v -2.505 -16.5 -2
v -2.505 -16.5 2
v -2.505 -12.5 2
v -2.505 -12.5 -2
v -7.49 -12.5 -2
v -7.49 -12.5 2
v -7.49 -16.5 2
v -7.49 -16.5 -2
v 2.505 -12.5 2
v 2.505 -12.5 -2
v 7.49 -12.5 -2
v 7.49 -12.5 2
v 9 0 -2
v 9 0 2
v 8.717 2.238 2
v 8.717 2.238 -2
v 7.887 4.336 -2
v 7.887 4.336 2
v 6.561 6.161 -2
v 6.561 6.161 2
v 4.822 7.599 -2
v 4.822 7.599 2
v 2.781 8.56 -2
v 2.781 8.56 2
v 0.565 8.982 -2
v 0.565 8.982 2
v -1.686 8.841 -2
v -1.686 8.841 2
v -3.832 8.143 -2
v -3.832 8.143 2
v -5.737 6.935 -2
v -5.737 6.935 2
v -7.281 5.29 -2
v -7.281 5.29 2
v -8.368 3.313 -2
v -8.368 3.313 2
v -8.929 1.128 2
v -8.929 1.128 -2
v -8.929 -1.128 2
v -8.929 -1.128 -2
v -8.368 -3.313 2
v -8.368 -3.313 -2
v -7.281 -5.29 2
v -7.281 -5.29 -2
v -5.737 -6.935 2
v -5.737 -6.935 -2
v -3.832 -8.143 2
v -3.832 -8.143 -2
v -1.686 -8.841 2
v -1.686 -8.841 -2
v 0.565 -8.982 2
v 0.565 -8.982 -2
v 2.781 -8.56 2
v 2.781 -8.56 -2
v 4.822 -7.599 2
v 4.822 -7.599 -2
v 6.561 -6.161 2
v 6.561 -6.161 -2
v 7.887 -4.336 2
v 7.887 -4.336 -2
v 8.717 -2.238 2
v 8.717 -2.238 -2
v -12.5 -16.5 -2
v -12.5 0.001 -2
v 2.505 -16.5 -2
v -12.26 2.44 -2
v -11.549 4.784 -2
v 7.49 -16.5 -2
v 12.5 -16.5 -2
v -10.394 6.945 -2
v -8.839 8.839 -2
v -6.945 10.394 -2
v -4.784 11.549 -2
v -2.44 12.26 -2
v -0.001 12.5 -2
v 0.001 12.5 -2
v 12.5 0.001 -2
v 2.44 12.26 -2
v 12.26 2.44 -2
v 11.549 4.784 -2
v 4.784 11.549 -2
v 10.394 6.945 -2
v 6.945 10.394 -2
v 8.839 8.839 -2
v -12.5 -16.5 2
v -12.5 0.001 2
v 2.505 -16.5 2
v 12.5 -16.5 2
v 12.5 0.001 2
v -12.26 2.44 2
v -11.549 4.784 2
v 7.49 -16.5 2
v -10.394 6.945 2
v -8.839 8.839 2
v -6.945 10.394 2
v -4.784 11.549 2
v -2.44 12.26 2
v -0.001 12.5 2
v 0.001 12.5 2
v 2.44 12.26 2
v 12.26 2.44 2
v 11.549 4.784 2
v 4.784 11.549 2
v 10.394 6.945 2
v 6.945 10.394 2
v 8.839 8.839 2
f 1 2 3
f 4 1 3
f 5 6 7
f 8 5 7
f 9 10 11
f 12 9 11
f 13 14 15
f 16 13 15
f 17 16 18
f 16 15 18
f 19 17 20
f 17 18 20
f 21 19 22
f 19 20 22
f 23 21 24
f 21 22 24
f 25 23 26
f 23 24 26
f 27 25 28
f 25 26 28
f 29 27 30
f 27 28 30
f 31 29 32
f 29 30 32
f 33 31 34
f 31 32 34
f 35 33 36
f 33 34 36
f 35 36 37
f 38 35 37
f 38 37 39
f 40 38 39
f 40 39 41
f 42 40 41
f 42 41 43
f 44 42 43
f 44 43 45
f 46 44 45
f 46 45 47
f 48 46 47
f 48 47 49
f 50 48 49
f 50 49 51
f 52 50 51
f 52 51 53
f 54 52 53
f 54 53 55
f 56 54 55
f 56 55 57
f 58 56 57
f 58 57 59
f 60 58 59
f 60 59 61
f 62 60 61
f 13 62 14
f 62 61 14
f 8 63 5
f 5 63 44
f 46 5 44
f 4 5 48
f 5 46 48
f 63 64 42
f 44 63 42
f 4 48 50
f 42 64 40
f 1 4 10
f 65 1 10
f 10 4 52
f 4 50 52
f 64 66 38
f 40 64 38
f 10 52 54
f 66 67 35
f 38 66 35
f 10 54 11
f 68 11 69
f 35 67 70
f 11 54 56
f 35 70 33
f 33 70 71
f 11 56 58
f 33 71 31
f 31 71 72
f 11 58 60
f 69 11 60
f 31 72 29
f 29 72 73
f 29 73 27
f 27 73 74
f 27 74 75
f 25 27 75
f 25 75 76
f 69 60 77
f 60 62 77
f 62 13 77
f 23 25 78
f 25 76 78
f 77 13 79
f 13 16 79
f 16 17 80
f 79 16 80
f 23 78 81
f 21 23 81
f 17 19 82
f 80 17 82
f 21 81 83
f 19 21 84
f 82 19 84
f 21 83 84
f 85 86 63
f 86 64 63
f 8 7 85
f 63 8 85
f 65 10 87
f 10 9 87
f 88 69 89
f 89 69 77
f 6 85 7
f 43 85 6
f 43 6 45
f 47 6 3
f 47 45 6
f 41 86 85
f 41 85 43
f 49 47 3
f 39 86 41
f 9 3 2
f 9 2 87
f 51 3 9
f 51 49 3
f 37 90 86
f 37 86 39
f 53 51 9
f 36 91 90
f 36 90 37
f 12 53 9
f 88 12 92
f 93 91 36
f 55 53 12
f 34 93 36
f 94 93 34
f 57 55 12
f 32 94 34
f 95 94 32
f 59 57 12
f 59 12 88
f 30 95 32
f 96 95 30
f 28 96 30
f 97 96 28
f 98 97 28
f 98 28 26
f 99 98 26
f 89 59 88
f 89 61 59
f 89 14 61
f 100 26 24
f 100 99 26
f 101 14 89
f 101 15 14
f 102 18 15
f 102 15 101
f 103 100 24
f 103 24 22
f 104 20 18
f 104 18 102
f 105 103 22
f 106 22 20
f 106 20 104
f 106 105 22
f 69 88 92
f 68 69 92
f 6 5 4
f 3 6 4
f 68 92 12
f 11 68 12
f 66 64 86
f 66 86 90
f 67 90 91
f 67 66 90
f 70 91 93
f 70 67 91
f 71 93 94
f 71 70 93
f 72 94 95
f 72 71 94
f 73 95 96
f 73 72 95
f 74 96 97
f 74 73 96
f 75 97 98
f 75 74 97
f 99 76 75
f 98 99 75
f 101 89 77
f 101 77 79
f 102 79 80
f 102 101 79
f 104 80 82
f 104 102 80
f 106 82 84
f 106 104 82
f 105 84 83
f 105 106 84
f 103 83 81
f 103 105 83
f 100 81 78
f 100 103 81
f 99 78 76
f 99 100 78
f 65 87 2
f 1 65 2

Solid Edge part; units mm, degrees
sketch "Sketch1" plane through (0, 0, 0) normal (0, 0, 1) x (1, 0, 0)
  line L0 (-12.5, -12.5) -> (12.5, -12.5)
  line L1 (12.5, -12.5) -> (12.5, 12.5)
  line L2 (12.5, 12.5) -> (-12.5, 12.5)
  line L3 (-12.5, 12.5) -> (-12.5, -12.5)
  dimension "D1" = 25
  dimension "D2" = 25
extrude "Protrusion1" add sketch "Sketch1" along normal mid plane 4
fillet "Verrundung_1" radius 12.5 2 edges at (12.5, 12.5, 0) (-12.5, 12.5, 0)
sketch "Sketch2" plane through (0, 0, 2) normal (0, 0, 1) x (1, 0, 0)
  circle A0 centre (0, 0) radius 9
  dimension "D1" = 18
extrude "Extrusionsausschnitt_1" cut sketch "Sketch2" against normal blind 16
sketch "Sketch3" plane through (0, 0, 2) normal (0, 0, 1) x (1, 0, 0)
  line L0 (-2.505, -12.5) -> (2.505, -12.5)
  line L1 (2.505, -12.5) -> (2.505, -16.5)
  line L2 (2.505, -16.5) -> (-2.505, -16.5)
  line L3 (-2.505, -16.5) -> (-2.505, -12.5)
  line L4 (7.49, -12.5) -> (12.5, -12.5)
  line L5 (12.5, -12.5) -> (12.5, -16.5)
  line L6 (12.5, -16.5) -> (7.49, -16.5)
  line L7 (7.49, -16.5) -> (7.49, -12.5)
  line L8 (-12.5, -12.5) -> (-7.49, -12.5)
  line L9 (-7.49, -12.5) -> (-7.49, -16.5)
  line L10 (-7.49, -16.5) -> (-12.5, -16.5)
  line L11 (-12.5, -16.5) -> (-12.5, -12.5)
  dimension "D1" = 4
  dimension "D2" = 4
  dimension "D3" = 4
  dimension "D4" = 5.01
  dimension "D5" = 5.01
  dimension "D6" = 5.01
extrude "Extrusionsausprägung_2" add sketch "Sketch3" against normal blind 4
properties material "Holz, Kiefer"
